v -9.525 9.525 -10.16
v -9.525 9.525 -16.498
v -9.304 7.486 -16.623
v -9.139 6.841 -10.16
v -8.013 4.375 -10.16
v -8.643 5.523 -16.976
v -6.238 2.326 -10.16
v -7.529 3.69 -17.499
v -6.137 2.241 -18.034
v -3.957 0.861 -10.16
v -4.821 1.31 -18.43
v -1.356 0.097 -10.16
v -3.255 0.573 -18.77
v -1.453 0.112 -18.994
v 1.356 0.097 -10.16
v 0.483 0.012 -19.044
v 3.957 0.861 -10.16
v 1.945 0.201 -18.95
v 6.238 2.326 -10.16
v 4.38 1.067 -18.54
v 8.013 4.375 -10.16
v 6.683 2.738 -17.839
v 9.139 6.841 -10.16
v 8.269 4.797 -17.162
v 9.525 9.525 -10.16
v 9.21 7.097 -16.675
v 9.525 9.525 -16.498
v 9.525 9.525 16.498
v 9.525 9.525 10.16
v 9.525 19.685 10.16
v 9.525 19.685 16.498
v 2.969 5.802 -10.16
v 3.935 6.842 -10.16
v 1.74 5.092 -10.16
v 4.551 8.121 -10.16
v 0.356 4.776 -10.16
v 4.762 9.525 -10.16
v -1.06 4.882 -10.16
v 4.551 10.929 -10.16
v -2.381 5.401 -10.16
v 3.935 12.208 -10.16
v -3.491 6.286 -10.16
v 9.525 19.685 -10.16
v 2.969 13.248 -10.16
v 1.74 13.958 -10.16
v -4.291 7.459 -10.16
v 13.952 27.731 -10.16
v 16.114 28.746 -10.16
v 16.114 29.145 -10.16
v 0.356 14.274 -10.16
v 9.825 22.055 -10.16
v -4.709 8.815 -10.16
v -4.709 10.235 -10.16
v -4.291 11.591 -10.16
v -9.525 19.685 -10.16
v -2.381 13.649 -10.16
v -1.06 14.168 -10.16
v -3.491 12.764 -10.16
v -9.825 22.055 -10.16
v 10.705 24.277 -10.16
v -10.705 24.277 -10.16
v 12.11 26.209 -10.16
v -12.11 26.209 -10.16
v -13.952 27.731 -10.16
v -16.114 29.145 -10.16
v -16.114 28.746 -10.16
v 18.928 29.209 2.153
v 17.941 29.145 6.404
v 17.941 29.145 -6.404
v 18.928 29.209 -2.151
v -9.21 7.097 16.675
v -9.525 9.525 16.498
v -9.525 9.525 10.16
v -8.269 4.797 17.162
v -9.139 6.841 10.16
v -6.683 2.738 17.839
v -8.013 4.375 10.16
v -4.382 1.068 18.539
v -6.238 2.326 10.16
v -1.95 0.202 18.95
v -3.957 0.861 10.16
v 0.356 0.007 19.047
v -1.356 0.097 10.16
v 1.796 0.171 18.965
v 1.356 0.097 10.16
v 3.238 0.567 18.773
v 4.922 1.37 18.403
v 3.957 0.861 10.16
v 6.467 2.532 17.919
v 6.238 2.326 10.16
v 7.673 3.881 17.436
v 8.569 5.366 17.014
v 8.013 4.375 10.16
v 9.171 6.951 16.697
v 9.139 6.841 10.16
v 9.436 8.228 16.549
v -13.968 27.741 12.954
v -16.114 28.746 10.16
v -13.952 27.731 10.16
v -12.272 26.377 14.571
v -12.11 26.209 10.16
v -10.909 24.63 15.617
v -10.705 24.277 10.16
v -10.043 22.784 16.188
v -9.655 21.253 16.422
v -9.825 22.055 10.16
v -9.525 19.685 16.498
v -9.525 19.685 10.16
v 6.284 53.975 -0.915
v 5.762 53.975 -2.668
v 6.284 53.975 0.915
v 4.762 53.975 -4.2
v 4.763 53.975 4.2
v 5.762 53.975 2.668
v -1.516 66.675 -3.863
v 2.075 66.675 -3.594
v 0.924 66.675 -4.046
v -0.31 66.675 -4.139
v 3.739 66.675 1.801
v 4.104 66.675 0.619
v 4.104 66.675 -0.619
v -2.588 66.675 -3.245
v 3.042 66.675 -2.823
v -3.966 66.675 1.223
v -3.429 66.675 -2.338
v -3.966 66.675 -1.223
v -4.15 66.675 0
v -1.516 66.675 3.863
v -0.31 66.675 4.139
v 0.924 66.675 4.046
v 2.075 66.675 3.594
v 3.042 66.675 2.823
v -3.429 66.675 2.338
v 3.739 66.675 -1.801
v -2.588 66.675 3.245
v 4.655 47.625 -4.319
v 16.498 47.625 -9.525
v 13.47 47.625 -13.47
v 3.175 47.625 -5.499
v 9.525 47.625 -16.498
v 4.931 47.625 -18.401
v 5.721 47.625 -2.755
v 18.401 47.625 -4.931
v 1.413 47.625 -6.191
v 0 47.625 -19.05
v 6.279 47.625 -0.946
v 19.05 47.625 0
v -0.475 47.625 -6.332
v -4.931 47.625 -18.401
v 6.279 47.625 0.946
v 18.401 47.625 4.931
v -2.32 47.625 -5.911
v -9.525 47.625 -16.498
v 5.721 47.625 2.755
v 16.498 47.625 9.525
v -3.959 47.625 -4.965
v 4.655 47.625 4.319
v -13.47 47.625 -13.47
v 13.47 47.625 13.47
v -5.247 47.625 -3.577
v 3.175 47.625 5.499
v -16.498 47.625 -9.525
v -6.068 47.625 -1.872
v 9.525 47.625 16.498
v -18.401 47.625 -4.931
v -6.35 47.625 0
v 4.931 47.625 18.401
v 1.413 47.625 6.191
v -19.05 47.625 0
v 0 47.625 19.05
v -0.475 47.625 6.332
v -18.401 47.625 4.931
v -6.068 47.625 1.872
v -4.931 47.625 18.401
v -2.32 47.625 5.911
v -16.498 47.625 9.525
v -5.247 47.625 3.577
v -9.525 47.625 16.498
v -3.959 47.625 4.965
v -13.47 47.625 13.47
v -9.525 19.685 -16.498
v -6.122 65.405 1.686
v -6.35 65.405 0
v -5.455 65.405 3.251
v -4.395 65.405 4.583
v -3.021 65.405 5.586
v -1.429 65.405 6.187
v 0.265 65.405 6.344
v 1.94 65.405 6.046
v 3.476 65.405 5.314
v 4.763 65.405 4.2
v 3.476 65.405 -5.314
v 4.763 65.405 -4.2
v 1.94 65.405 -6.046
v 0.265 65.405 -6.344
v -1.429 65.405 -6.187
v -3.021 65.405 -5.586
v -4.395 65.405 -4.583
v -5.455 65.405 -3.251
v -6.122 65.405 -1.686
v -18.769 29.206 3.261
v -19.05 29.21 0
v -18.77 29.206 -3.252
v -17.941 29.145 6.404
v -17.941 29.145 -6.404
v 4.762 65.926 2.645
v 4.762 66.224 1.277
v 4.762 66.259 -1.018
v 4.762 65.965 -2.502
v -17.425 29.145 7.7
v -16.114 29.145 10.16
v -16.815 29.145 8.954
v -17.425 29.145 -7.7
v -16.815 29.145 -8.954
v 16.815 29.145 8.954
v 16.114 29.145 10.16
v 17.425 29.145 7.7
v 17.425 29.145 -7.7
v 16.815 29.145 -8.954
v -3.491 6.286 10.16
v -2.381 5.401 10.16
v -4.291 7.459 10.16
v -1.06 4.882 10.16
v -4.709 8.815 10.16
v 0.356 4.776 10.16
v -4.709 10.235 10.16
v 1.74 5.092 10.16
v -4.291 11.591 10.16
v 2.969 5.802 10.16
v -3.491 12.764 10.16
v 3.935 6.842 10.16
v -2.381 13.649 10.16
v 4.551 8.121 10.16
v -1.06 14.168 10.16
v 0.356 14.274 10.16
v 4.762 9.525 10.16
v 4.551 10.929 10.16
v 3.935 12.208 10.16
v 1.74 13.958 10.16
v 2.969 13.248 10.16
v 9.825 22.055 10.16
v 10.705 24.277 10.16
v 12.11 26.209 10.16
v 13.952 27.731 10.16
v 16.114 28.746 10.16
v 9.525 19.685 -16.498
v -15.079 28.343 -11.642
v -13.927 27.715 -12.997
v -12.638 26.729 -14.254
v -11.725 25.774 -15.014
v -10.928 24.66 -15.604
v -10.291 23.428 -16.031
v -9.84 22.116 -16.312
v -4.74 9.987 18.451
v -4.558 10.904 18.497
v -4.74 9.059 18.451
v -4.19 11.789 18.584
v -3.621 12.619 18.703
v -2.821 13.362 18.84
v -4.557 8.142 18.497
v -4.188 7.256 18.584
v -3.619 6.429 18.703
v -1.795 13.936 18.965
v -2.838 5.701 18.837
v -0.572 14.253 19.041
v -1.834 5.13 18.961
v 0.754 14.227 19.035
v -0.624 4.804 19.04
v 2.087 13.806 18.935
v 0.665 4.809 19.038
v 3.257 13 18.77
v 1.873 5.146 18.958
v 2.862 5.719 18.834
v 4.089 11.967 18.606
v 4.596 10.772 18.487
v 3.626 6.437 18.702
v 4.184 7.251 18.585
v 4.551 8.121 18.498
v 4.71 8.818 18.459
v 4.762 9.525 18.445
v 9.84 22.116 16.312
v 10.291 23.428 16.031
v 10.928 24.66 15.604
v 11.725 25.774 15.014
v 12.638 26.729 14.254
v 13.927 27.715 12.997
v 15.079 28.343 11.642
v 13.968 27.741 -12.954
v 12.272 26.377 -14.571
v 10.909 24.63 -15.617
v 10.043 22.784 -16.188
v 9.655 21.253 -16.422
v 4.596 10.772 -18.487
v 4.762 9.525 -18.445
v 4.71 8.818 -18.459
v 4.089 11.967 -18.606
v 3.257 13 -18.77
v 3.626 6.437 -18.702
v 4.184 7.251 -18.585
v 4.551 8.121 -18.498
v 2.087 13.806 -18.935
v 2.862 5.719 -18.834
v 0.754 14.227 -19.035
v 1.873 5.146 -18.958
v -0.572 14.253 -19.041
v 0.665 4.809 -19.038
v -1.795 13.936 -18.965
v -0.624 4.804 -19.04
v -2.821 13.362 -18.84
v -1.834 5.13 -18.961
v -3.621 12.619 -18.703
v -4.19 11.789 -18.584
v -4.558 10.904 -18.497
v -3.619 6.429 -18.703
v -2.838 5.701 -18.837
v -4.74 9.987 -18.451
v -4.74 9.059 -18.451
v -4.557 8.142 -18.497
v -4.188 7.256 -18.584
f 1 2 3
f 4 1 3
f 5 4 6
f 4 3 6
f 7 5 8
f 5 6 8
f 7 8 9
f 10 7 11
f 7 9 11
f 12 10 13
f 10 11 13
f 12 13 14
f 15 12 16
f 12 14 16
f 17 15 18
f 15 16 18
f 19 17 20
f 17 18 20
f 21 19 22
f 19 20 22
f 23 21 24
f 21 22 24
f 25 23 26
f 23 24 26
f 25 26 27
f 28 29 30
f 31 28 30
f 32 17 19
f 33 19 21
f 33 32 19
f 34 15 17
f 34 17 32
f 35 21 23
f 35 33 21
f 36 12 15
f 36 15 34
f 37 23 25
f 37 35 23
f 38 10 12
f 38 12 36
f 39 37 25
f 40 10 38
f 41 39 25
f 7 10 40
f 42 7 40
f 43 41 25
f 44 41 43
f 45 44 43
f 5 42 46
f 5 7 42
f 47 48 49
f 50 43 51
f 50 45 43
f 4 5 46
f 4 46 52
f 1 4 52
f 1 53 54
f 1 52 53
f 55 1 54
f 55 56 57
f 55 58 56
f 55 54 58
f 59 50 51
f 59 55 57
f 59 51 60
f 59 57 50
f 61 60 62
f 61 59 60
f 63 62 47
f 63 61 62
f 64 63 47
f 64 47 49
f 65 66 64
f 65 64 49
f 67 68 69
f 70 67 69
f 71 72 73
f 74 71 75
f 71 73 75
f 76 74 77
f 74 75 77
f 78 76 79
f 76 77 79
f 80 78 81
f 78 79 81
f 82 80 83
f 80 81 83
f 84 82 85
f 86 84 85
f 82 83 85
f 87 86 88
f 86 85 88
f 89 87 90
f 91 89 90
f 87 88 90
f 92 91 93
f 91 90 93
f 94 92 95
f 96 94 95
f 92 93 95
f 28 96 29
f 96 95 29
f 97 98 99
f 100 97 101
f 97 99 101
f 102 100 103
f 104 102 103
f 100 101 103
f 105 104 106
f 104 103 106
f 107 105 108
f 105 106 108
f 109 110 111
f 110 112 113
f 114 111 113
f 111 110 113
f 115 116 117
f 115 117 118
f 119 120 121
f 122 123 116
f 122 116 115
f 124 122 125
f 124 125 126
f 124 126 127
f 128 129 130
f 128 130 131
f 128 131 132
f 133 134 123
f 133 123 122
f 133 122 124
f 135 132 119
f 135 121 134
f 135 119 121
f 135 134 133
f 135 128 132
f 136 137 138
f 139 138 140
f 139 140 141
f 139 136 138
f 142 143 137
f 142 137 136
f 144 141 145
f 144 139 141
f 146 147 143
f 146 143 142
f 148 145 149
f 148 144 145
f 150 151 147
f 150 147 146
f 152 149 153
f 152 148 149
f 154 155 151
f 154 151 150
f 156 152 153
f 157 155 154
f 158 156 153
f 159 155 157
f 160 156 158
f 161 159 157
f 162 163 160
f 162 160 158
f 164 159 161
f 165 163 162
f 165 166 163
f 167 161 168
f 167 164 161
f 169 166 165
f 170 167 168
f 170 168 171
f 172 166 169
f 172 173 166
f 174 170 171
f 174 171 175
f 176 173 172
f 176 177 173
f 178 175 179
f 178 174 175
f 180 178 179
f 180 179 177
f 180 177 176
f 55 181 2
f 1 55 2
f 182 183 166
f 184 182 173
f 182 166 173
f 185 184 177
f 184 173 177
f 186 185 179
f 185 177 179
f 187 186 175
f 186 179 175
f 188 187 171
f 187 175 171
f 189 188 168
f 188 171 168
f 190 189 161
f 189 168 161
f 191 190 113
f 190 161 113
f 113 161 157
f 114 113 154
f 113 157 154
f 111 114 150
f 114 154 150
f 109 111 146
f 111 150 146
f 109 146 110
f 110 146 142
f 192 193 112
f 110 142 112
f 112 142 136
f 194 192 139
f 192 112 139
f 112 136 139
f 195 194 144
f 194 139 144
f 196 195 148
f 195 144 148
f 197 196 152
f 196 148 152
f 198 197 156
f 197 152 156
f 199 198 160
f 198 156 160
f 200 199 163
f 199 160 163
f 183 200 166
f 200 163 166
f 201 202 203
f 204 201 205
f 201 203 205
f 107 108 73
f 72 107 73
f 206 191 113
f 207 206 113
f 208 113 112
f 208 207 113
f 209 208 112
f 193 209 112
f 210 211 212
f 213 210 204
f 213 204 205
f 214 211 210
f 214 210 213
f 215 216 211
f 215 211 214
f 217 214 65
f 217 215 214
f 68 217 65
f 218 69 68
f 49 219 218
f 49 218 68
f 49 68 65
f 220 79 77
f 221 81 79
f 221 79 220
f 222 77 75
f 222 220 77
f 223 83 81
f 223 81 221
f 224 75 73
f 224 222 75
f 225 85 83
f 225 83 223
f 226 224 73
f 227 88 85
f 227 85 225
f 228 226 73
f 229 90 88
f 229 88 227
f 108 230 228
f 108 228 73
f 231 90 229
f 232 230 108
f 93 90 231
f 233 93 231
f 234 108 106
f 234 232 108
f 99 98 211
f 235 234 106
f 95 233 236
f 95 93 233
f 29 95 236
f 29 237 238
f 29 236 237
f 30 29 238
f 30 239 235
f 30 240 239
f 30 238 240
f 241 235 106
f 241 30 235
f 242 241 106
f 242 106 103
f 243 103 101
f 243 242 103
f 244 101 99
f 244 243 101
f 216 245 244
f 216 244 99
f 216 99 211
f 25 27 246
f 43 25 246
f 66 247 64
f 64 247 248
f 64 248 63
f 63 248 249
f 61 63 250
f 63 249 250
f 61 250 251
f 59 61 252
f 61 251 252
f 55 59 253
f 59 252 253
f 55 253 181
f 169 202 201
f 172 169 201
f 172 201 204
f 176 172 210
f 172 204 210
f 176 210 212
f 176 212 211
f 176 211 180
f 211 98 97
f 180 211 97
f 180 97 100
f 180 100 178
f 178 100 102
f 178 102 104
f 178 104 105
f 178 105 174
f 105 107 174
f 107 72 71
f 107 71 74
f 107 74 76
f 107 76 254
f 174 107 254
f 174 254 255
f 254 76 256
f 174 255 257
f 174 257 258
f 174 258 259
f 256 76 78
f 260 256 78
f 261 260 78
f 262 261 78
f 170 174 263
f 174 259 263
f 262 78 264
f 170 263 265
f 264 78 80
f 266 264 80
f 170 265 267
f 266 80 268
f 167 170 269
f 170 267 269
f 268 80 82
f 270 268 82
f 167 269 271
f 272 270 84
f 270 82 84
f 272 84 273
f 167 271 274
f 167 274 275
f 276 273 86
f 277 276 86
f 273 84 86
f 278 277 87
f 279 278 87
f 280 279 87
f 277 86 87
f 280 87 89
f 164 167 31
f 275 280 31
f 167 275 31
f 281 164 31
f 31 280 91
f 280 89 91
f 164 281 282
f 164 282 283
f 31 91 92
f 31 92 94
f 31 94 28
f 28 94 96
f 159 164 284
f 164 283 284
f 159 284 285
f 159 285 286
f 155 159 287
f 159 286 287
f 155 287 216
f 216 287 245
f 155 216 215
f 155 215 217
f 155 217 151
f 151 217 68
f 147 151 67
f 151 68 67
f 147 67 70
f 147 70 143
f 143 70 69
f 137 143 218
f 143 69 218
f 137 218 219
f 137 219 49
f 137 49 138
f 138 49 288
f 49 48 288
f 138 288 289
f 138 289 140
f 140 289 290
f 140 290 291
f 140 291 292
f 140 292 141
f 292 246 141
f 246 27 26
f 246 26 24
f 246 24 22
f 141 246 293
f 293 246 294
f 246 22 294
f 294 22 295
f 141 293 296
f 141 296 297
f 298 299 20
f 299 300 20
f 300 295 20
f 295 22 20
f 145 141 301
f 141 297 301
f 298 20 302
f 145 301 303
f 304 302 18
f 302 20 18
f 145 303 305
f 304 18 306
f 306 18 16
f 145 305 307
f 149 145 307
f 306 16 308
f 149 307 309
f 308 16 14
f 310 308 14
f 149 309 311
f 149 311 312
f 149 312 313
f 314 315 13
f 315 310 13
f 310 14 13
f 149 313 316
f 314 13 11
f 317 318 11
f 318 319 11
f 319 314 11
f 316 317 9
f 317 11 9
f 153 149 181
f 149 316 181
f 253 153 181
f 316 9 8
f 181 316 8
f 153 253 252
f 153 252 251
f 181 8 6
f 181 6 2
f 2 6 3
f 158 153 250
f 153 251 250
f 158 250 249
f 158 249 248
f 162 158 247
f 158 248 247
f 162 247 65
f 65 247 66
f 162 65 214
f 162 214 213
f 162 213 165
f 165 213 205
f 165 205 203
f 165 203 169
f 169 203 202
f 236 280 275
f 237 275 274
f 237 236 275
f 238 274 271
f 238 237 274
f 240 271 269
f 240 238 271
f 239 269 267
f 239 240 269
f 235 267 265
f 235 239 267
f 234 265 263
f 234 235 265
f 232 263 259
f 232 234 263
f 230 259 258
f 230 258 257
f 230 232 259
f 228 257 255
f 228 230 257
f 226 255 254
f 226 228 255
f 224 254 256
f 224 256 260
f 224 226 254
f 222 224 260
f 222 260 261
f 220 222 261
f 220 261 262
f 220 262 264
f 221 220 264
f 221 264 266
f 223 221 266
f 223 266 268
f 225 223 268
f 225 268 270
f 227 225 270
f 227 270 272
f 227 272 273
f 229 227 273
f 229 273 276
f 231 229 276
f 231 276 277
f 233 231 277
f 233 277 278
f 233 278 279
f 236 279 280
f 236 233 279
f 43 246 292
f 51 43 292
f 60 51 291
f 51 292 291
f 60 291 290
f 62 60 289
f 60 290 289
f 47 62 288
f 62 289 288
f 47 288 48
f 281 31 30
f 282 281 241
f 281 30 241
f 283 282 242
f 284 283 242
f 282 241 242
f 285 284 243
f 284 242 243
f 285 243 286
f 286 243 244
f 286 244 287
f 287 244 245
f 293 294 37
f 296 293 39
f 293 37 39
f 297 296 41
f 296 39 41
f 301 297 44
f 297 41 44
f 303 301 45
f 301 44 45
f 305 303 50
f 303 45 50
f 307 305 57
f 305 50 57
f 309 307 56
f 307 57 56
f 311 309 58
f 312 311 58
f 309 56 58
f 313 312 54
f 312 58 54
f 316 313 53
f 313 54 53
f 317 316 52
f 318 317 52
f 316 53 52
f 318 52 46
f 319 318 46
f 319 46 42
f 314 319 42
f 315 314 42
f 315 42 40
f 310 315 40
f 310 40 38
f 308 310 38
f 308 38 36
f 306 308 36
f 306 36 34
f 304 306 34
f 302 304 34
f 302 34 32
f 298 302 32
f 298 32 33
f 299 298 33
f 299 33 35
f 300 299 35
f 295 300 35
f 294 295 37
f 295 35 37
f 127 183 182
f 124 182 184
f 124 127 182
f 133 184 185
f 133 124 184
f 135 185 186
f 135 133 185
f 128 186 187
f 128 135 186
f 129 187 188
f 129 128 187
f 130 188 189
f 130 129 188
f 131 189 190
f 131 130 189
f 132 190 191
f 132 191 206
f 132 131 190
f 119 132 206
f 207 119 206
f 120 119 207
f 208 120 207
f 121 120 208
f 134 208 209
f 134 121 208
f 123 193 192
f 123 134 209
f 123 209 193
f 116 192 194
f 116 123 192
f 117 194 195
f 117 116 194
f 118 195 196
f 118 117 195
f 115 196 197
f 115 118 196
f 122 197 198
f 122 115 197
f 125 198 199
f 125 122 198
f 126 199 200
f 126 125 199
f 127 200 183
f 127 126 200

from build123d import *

# Parameters (mm, degrees)
SKETCH1_R               = 19.05
BASE_EXTRUDE_DEPTH      = 47.625
CUT_EXTRUDE1_DEPTH      = 20.05
CUT_EXTRUDE1_DEPTH_BACK = 20.05
SKETCH8_W               = 20.32
SKETCH8_H               = 36.600526062
CUT_EXTRUDE5_DEPTH      = 47.625
CUT_EXTRUDE5_DEPTH_BACK = 20.0500001
SKETCH11_R              = 4.7625
CUT_EXTRUDE6_DEPTH      = 20.0500001
CUT_EXTRUDE6_DEPTH_BACK = 20.0500001
SKETCH12_R              = 6.35
BOSS_EXTRUDE1_DEPTH     = 19.05
CHAMFER3_SIZE           = 1.27
CHAMFER3_SIZE2          = 2.199704526
CUT_EXTRUDE7_DEPTH      = 12.7


with BuildPart() as part:
    # Sketch1 → Base-Extrude (new body)
    with BuildSketch(Plane(origin=(0, 0, 0), x_dir=(-1, 0, 0), z_dir=(0, 1, 0))):
        Circle(SKETCH1_R)
    extrude(amount=BASE_EXTRUDE_DEPTH)

    # Sketch2 → Cut-Extrude1 (cut, two sides)
    with BuildSketch(Plane.XY) as cut_extrude1_sk:
        with BuildLine():
            Line((9.525, 9.525), (9.525, 19.685))
            ThreePointArc((9.525, 19.685), (12.314807909, 26.420192091), (19.05, 29.21))
            Line((19.05, 29.21), (19.05, -1.366191125))
            Line((19.05, -1.366191125), (-19.05, -1.366191125))
            Line((-19.05, -1.366191125), (-19.05, 29.21))
            ThreePointArc((-19.05, 29.21), (-12.314807909, 26.420192091), (-9.525, 19.685))
            Line((-9.525, 19.685), (-9.525, 9.525))
            ThreePointArc((-9.525, 9.525), (0, 0), (9.525, 9.525))
        make_face()
    extrude(amount=CUT_EXTRUDE1_DEPTH, mode=Mode.SUBTRACT)
    extrude(cut_extrude1_sk.sketch, amount=-CUT_EXTRUDE1_DEPTH_BACK, mode=Mode.SUBTRACT)

    # Sketch8 → Cut-Extrude5 (cut, two sides)
    with BuildSketch(Plane(origin=(0, 0, 0), x_dir=(0, 0, -1), z_dir=(1, 0, 0))) as cut_extrude5_sk:
        with Locations((0, 10.844975795)):
            Rectangle(SKETCH8_W, SKETCH8_H)
    extrude(amount=CUT_EXTRUDE5_DEPTH, mode=Mode.SUBTRACT)
    extrude(cut_extrude5_sk.sketch, amount=-CUT_EXTRUDE5_DEPTH_BACK, mode=Mode.SUBTRACT)

    # Sketch11 → Cut-Extrude6 (cut, two sides)
    with BuildSketch(Plane.XY) as cut_extrude6_sk:
        with Locations((0, 9.525)):
            Circle(SKETCH11_R)
    extrude(amount=CUT_EXTRUDE6_DEPTH, mode=Mode.SUBTRACT)
    extrude(cut_extrude6_sk.sketch, amount=-CUT_EXTRUDE6_DEPTH_BACK, mode=Mode.SUBTRACT)

    # Sketch12 → Boss-Extrude1 (add)
    with BuildSketch(Plane(origin=(0, 47.625, 0), x_dir=(-1, 0, 0), z_dir=(0, 1, 0))):
        Circle(SKETCH12_R)
    extrude(amount=BOSS_EXTRUDE1_DEPTH)

    # Chamfer3
    chamfer3_edges = [part.edges().sort_by_distance(p)[0] for p in [
        (6.35, 66.675, 0),
    ]]
    chamfer3_side = [part.faces().sort_by_distance(p)[0] for p in [
        (6.35, 57.15, 0),
    ]]
    chamfer(chamfer3_edges, length=CHAMFER3_SIZE, length2=CHAMFER3_SIZE2, reference=chamfer3_side[0])

    # Sketch13 → Cut-Extrude7 (cut)
    with BuildSketch(Plane(origin=(0, 66.675, 0), x_dir=(-1, 0, 0), z_dir=(0, 1, 0))):
        with BuildLine():
            Line((-4.7625, 4.200130206), (-4.7625, -4.200130206))
            ThreePointArc((-4.7625, -4.200130206), (-6.35, 0), (-4.7625, 4.200130206))
        make_face()
    extrude(amount=-CUT_EXTRUDE7_DEPTH, mode=Mode.SUBTRACT)


solid = part.part
